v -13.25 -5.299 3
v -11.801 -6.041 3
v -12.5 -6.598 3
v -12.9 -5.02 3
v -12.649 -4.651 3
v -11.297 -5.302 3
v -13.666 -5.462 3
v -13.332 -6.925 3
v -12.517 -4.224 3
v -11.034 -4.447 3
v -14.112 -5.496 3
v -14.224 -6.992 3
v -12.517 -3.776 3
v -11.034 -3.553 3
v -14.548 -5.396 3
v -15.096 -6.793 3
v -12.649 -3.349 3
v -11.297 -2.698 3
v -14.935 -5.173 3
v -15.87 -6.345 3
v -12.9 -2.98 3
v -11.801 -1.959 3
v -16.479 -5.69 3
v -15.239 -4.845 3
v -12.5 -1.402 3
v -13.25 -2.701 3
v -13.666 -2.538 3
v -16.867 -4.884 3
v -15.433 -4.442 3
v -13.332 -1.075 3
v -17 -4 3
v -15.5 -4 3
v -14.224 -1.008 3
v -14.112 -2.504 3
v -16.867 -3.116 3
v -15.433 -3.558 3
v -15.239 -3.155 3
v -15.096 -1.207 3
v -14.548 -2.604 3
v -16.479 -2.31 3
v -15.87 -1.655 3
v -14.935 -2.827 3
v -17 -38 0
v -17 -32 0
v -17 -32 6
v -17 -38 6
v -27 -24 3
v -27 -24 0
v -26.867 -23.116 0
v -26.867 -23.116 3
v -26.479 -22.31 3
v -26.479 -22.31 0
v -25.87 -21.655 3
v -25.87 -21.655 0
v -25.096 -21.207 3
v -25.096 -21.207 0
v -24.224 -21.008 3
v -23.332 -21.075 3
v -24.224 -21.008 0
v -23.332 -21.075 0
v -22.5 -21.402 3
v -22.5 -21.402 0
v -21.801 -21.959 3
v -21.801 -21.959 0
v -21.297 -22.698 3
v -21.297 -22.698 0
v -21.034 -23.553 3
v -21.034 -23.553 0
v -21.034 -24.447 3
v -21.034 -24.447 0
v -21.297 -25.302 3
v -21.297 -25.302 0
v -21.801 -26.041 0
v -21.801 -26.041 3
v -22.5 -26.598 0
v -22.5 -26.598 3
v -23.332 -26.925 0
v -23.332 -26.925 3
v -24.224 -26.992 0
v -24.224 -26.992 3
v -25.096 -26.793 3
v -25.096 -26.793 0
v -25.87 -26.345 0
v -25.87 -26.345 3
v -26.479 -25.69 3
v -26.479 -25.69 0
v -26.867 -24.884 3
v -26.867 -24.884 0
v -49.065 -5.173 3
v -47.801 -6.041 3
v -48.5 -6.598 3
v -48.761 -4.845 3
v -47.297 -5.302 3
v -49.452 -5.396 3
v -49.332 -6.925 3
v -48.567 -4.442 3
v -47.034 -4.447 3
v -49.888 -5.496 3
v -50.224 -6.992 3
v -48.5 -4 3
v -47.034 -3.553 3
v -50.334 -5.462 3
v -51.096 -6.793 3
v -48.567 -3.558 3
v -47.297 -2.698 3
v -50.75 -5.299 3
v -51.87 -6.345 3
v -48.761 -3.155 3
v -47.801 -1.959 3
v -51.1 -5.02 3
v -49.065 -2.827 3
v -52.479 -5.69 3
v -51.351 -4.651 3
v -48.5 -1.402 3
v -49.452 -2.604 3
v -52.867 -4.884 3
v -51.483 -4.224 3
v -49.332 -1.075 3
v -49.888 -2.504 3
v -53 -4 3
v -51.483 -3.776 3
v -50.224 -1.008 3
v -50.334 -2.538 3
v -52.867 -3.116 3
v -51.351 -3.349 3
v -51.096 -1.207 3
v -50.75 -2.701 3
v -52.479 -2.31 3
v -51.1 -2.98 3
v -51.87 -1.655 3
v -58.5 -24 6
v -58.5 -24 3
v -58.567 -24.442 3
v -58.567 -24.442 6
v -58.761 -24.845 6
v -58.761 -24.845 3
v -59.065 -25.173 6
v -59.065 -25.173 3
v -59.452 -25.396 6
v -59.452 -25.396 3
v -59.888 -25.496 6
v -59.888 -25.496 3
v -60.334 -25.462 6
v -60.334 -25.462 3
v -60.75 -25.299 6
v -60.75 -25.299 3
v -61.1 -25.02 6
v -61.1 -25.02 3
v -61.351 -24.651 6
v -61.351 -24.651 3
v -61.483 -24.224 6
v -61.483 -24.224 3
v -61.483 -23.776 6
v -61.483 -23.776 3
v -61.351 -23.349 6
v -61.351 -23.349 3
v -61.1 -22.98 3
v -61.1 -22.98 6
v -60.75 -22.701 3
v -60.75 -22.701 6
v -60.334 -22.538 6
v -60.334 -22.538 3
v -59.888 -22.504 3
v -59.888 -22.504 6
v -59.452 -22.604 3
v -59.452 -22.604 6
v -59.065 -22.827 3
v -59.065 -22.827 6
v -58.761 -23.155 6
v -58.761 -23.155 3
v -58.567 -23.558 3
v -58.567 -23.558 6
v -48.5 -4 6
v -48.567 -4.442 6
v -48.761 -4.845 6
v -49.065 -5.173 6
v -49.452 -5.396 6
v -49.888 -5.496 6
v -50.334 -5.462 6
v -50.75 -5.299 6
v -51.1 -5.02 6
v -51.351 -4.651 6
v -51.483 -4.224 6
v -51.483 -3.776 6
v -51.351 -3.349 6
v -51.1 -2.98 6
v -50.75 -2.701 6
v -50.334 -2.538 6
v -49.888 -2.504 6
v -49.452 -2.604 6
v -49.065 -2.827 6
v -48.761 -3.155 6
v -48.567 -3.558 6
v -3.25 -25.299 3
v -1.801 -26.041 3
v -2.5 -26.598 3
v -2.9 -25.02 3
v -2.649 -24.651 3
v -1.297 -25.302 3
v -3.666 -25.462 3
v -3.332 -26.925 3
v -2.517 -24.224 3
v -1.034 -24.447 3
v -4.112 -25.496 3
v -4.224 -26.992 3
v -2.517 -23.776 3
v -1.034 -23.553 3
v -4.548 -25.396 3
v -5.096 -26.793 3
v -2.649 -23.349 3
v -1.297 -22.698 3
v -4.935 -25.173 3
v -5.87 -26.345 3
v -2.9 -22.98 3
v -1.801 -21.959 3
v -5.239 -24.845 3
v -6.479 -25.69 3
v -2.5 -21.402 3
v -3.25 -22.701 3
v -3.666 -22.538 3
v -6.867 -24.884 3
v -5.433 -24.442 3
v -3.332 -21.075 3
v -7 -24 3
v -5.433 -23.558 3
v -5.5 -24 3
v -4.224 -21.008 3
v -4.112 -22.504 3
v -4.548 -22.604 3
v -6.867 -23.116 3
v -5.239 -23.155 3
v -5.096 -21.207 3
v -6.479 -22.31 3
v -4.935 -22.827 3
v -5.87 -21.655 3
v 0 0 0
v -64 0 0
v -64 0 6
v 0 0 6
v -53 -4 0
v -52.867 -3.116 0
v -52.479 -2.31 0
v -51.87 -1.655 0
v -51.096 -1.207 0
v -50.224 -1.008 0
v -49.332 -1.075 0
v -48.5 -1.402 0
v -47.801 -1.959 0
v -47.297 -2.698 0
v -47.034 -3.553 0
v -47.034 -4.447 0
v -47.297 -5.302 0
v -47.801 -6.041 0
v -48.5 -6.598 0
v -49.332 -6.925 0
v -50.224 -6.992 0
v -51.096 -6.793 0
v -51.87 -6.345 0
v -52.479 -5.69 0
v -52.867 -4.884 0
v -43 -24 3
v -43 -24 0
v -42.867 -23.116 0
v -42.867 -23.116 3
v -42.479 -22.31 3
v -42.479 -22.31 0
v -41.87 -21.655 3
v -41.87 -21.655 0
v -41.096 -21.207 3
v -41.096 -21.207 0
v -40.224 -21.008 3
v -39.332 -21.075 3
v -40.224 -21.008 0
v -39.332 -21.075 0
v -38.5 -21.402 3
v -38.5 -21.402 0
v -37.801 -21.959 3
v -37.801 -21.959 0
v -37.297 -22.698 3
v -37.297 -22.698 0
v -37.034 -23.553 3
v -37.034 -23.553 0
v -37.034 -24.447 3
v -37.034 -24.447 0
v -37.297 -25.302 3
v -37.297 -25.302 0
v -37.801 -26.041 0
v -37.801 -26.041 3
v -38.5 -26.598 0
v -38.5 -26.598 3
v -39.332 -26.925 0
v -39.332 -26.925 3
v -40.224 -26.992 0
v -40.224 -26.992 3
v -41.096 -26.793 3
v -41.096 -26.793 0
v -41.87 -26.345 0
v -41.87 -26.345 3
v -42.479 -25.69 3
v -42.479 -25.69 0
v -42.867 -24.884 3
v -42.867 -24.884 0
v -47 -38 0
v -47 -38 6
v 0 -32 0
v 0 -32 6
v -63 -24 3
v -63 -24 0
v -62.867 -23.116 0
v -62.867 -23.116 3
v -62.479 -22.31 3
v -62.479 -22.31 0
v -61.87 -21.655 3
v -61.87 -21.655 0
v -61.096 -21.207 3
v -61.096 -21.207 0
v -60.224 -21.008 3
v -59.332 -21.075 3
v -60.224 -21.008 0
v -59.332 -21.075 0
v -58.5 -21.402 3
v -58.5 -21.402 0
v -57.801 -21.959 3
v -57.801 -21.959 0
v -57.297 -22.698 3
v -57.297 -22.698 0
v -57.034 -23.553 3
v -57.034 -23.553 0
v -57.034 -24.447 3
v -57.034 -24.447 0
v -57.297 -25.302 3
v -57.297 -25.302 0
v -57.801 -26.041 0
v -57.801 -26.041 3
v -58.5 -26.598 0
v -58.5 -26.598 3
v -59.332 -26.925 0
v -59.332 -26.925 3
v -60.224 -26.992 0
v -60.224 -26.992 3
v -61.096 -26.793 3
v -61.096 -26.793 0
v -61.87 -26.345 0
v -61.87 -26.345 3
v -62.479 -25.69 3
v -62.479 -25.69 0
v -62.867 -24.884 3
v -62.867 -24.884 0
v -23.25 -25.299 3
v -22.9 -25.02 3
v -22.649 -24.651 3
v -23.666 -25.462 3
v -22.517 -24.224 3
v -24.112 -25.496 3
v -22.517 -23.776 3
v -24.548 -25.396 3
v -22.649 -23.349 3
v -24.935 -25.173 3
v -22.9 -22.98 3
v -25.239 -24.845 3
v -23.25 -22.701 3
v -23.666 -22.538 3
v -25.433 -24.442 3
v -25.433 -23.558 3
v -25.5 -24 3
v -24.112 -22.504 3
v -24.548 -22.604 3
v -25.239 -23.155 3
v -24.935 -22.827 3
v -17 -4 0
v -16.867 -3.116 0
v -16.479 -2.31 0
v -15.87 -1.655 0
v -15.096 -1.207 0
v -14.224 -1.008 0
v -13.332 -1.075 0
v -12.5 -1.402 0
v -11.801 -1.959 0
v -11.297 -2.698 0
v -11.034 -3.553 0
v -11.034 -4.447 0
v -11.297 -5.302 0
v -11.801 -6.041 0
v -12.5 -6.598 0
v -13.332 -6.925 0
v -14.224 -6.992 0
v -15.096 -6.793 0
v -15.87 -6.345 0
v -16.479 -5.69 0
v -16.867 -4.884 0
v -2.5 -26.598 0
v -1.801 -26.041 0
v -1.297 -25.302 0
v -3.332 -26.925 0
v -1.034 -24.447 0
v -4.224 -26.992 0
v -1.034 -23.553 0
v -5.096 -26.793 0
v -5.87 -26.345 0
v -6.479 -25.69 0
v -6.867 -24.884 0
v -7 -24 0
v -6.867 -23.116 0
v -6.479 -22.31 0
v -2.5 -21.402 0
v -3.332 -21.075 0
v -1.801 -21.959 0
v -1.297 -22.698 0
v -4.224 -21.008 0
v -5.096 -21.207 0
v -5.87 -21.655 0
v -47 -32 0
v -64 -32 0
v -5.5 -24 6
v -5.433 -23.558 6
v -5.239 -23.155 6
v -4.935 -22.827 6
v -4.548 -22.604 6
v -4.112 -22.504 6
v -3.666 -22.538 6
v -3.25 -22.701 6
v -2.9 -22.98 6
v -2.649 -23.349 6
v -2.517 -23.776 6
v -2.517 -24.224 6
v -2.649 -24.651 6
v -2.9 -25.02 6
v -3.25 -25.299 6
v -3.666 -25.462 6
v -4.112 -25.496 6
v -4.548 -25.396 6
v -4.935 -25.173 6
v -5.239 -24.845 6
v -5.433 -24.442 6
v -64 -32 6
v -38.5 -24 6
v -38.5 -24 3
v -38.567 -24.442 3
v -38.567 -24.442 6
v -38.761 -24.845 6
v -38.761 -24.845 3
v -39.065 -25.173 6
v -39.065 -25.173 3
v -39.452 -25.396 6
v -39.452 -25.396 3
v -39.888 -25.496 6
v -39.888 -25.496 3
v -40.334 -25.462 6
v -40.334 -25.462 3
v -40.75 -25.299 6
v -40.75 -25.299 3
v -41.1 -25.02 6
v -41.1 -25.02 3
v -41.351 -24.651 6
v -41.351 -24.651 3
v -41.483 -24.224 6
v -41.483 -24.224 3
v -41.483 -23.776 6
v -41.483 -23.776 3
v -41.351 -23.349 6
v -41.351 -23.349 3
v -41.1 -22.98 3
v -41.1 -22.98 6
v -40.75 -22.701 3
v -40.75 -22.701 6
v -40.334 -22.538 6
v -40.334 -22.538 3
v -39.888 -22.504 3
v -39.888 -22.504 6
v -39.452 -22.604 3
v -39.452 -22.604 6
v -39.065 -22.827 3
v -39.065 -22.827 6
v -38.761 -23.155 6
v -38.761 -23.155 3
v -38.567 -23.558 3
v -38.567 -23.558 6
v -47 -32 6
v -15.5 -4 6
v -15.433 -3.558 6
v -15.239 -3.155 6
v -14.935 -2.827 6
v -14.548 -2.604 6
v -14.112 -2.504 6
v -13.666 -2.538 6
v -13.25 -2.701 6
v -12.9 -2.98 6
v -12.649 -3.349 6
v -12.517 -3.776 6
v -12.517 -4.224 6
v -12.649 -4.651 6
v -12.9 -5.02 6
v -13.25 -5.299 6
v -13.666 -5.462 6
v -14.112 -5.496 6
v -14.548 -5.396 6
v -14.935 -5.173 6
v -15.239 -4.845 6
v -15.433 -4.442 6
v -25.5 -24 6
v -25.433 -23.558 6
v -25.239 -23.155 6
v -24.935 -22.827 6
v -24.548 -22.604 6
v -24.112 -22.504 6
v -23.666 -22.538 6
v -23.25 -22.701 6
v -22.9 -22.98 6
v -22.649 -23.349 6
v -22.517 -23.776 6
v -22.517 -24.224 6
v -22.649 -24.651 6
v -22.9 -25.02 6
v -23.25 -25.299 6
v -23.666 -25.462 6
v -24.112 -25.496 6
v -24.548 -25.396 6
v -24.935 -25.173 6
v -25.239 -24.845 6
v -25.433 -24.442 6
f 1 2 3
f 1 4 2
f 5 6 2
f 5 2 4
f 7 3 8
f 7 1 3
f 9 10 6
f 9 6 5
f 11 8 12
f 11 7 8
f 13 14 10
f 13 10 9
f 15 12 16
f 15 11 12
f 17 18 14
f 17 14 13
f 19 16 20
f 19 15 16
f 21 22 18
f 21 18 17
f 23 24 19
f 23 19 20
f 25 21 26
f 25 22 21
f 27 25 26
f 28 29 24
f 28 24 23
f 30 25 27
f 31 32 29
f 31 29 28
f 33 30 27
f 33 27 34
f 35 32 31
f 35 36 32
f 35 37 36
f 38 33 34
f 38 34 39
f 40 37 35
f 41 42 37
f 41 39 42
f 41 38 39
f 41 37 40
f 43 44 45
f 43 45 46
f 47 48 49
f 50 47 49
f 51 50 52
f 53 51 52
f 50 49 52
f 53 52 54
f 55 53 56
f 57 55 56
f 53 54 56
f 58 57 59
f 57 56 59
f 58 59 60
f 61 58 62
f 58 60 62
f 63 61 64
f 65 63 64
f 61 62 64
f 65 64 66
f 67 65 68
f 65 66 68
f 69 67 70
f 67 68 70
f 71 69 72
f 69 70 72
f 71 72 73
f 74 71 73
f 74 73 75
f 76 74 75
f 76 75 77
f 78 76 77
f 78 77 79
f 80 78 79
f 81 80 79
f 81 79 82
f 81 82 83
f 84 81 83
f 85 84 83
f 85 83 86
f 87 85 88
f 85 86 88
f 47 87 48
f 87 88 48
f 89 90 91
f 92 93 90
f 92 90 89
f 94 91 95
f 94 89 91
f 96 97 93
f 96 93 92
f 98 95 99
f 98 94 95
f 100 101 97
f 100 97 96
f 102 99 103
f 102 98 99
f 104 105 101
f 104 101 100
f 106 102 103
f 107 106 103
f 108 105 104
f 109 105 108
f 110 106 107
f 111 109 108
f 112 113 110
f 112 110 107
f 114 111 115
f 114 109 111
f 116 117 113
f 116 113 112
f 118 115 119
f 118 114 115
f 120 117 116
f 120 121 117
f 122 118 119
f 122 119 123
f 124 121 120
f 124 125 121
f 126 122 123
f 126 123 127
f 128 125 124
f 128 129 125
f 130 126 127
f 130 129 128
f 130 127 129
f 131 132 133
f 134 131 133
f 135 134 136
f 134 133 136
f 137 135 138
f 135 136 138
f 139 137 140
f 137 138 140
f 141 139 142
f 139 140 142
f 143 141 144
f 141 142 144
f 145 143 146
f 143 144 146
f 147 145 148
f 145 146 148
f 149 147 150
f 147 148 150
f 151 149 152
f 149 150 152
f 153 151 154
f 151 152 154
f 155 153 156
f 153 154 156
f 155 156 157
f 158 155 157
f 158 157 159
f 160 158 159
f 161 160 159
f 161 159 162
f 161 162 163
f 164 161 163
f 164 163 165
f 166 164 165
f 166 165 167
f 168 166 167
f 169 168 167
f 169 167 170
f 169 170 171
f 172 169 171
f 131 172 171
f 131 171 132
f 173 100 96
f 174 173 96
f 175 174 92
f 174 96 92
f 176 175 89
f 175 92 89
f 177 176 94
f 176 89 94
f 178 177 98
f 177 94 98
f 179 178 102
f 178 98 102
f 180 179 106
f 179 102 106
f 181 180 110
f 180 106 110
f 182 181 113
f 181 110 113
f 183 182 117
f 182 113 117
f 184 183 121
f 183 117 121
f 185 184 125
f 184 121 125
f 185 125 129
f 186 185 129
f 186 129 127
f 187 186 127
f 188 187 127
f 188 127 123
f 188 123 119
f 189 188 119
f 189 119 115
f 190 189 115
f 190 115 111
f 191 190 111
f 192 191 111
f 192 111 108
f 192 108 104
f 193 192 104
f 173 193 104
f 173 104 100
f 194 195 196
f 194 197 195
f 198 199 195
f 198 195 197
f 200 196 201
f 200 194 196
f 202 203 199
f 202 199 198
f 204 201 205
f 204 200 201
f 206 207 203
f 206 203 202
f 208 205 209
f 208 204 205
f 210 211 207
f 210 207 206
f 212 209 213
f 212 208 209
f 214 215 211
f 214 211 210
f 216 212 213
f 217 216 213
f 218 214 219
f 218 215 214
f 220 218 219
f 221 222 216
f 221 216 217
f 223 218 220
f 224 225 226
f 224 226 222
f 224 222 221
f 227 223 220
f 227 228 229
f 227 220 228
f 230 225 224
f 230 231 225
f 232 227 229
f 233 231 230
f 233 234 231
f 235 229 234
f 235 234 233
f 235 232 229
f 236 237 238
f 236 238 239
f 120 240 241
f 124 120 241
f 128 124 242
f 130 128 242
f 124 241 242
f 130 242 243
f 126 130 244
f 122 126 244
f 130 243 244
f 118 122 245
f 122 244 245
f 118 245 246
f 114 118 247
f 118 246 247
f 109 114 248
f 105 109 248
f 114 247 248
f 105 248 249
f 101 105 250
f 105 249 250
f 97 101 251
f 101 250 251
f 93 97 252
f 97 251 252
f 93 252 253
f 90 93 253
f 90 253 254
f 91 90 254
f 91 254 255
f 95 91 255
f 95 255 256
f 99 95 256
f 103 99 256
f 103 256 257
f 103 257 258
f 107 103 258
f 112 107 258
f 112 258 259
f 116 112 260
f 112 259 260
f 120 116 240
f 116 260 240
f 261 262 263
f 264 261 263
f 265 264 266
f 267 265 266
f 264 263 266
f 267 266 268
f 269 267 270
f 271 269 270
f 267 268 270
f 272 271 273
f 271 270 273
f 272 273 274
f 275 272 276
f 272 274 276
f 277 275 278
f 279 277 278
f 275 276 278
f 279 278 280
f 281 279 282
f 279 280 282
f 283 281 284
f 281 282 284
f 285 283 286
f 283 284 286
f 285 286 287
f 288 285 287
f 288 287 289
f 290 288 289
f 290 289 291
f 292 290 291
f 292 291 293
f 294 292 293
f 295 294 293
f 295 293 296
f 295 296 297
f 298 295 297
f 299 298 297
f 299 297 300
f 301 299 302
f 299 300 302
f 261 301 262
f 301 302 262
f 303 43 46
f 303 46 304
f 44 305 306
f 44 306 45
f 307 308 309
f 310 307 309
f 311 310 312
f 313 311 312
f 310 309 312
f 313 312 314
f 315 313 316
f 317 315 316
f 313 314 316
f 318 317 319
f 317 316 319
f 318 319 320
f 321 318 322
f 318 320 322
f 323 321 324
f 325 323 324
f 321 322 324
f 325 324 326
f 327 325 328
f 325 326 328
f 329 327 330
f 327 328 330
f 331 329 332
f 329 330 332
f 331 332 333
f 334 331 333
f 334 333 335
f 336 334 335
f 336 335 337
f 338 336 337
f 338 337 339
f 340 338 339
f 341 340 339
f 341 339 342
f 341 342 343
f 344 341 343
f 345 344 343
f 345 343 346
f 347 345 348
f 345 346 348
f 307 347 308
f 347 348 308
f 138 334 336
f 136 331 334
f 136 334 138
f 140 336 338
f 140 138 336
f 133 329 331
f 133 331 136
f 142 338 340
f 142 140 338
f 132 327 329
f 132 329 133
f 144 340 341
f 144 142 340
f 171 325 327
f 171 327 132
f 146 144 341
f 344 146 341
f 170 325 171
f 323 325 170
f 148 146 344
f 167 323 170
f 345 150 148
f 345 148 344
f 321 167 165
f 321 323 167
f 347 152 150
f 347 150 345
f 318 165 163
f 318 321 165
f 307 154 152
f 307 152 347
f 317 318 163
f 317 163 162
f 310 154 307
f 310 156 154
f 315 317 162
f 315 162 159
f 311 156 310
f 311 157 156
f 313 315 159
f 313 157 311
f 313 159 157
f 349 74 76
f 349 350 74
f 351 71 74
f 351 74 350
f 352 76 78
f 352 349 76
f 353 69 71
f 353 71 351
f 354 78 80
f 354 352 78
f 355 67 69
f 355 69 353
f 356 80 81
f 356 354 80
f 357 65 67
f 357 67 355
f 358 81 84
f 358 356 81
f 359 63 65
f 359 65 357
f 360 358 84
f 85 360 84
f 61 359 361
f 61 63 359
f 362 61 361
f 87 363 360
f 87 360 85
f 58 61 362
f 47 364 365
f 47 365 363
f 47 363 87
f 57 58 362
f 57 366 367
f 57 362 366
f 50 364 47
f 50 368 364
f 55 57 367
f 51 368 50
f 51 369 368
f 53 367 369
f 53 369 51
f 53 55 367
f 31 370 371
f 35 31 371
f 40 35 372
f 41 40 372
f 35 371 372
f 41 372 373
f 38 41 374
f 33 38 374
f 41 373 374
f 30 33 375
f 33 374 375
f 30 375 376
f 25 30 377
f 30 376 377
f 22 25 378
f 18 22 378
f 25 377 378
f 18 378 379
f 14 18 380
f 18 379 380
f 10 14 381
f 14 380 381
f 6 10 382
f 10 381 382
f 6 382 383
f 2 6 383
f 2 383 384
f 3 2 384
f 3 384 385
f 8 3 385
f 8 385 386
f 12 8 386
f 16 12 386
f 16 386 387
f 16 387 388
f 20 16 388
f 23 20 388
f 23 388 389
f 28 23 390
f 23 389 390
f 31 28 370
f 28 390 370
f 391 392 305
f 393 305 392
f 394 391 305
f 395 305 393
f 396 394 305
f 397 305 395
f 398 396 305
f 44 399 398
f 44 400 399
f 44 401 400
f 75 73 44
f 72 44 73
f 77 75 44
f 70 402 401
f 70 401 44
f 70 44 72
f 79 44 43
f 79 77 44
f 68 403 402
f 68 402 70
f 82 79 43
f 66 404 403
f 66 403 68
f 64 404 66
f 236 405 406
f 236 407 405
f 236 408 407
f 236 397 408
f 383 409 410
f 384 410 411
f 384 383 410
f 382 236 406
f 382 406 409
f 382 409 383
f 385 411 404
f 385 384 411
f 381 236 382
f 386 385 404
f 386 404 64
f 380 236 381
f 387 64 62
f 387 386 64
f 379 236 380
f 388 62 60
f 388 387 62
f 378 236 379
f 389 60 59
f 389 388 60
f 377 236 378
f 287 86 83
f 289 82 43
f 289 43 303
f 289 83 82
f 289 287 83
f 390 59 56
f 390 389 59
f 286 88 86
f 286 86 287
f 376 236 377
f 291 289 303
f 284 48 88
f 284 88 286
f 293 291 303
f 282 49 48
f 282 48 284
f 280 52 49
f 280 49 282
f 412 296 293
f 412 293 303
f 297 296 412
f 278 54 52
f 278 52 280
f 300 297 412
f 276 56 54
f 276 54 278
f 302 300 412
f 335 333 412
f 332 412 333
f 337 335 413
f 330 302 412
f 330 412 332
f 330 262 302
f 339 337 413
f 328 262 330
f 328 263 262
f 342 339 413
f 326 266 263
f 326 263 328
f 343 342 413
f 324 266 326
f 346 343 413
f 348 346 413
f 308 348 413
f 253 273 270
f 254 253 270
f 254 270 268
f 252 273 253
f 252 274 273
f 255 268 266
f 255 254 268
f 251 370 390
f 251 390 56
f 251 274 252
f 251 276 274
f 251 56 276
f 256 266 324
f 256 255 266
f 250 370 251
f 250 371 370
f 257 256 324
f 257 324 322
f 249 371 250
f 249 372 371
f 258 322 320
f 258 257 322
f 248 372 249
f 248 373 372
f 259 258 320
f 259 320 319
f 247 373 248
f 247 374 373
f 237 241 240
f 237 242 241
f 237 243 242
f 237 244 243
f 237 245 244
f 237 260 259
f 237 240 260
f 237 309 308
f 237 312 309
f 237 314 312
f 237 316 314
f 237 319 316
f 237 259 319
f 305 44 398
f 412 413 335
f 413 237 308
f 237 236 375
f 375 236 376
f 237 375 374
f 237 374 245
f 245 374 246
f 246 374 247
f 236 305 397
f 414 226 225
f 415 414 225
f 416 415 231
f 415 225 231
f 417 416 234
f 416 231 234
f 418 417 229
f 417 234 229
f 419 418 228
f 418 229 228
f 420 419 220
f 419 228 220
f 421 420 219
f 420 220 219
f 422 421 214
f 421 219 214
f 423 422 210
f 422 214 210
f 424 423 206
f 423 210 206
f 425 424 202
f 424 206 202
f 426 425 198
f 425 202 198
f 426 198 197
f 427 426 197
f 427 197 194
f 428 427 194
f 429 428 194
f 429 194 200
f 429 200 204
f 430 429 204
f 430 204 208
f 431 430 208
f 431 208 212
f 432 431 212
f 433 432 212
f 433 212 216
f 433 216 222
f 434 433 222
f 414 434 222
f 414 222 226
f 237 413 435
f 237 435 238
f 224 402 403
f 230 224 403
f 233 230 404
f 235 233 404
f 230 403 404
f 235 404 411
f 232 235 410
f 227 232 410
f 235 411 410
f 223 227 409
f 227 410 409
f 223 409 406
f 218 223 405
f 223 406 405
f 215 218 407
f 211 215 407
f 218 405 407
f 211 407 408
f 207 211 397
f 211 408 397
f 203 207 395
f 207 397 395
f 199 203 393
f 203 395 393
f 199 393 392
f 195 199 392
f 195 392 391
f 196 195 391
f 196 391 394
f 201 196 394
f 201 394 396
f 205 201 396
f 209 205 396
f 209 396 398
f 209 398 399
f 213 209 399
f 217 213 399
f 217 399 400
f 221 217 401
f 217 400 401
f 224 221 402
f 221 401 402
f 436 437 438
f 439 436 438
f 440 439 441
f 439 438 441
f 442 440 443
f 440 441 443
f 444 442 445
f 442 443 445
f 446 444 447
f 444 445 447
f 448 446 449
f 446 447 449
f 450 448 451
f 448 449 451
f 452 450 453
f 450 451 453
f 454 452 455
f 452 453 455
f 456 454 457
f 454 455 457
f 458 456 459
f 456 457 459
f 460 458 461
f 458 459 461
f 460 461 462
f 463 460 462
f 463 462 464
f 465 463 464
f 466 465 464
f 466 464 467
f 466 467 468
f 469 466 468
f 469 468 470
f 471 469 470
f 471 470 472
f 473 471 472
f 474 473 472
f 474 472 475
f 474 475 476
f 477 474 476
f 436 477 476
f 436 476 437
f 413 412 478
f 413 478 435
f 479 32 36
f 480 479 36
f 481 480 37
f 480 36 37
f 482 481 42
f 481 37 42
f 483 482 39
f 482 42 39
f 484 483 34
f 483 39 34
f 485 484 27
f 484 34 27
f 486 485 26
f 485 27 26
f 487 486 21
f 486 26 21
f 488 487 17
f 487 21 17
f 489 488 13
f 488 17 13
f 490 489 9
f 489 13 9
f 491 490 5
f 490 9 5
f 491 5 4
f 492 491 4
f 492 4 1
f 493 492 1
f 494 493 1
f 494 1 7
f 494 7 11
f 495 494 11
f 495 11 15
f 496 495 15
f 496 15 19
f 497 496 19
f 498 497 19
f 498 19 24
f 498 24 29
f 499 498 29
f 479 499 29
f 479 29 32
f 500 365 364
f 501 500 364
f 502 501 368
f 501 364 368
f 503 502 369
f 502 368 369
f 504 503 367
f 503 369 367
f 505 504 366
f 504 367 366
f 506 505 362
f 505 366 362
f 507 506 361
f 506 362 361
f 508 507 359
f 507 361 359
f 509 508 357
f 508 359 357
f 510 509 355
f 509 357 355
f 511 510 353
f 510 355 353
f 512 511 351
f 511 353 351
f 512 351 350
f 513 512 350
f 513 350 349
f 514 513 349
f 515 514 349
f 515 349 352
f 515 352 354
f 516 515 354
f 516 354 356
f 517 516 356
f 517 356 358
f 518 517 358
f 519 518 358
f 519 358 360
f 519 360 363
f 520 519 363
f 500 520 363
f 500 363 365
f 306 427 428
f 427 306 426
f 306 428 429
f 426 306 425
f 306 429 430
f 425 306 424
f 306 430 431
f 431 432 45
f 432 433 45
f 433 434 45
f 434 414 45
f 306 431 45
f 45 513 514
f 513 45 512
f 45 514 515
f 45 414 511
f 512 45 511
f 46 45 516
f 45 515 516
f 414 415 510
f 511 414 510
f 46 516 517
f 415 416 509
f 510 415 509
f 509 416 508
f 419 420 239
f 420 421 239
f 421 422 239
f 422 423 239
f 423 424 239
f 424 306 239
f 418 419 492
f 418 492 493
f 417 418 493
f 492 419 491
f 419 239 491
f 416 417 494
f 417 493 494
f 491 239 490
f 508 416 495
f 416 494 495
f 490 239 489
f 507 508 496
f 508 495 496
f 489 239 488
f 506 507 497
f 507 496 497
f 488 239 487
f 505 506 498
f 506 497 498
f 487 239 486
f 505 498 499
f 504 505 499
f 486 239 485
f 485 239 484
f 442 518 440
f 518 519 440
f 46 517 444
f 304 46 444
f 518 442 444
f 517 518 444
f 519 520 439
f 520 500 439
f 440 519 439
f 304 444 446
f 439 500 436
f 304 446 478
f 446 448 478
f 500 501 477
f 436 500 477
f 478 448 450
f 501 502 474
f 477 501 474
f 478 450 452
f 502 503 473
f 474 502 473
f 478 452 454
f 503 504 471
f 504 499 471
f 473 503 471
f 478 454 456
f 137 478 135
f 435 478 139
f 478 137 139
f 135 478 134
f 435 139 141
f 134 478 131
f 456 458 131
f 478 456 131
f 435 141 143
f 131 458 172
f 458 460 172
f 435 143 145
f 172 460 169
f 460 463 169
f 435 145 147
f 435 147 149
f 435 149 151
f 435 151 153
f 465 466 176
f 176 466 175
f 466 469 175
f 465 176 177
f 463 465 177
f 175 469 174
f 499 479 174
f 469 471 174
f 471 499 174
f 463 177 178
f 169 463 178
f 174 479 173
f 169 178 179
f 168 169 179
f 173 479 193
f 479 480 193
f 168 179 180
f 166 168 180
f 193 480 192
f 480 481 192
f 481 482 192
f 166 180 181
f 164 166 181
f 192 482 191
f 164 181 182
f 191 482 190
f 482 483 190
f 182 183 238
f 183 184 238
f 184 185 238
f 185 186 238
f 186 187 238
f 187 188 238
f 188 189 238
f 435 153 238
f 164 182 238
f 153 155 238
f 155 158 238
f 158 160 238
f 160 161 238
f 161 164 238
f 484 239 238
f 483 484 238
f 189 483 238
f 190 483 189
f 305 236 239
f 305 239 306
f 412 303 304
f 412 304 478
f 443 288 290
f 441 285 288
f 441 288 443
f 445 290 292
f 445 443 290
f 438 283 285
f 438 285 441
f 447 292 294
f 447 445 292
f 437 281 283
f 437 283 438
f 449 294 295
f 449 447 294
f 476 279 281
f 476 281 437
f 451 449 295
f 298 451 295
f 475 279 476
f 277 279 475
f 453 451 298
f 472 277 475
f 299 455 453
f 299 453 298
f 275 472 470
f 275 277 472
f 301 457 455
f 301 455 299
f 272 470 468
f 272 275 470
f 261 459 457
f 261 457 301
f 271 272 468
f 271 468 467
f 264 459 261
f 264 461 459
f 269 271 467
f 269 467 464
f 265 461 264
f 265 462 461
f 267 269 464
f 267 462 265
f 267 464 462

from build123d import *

# Parameters (mm, degrees)
BOSS_EXTRU_1_DEPTH      = 6
ESQUISSE2_R             = 1.5
ENL_V_MAT_EXTRU_1_DEPTH = 75.67261881
ESQUISSE3_R             = 3
ENL_V_MAT_EXTRU_2_DEPTH = 3


with BuildPart() as part:
    # Esquisse1 → Boss.-Extru.1 (new body)
    with BuildSketch(Plane.XY):
        Polygon((0, -32), (-17, -32), (-17, -38), (-47, -38), (-47, -32), (-64, -32), (-64, 0), (0, 0), align=None)
    extrude(amount=BOSS_EXTRU_1_DEPTH)

    # Esquisse2 → Enlèv. mat.-Extru.1 (cut, through all)
    with BuildSketch(Plane(origin=(0, 0, 0), x_dir=(-1, 0, 0), z_dir=(0, 0, -1))):
        with Locations((14, -4)):
            Circle(ESQUISSE2_R)
        with Locations((4, -24)):
            Circle(ESQUISSE2_R)
        with Locations((24, -24)):
            Circle(ESQUISSE2_R)
        with Locations(Location((40, -24, 0), (0, 0, 180))):
            Circle(ESQUISSE2_R)
        with Locations(Location((60, -24, 0), (0, 0, 180))):
            Circle(ESQUISSE2_R)
        with Locations(Location((50, -4, 0), (0, 0, 180))):
            Circle(ESQUISSE2_R)
    extrude(amount=-ENL_V_MAT_EXTRU_1_DEPTH, mode=Mode.SUBTRACT)

    # Esquisse3 → Enlèv. mat.-Extru.2 (cut)
    with BuildSketch(Plane(origin=(0, 0, 0), x_dir=(-1, 0, 0), z_dir=(0, 0, -1))):
        with Locations((14, -4)):
            Circle(ESQUISSE3_R)
        with Locations((4, -24)):
            Circle(ESQUISSE3_R)
        with Locations((24, -24)):
            Circle(ESQUISSE3_R)
        with Locations((40, -24)):
            Circle(ESQUISSE3_R)
        with Locations((60, -24)):
            Circle(ESQUISSE3_R)
        with Locations((50, -4)):
            Circle(ESQUISSE3_R)
    extrude(amount=-ENL_V_MAT_EXTRU_2_DEPTH, mode=Mode.SUBTRACT)


solid = part.part
